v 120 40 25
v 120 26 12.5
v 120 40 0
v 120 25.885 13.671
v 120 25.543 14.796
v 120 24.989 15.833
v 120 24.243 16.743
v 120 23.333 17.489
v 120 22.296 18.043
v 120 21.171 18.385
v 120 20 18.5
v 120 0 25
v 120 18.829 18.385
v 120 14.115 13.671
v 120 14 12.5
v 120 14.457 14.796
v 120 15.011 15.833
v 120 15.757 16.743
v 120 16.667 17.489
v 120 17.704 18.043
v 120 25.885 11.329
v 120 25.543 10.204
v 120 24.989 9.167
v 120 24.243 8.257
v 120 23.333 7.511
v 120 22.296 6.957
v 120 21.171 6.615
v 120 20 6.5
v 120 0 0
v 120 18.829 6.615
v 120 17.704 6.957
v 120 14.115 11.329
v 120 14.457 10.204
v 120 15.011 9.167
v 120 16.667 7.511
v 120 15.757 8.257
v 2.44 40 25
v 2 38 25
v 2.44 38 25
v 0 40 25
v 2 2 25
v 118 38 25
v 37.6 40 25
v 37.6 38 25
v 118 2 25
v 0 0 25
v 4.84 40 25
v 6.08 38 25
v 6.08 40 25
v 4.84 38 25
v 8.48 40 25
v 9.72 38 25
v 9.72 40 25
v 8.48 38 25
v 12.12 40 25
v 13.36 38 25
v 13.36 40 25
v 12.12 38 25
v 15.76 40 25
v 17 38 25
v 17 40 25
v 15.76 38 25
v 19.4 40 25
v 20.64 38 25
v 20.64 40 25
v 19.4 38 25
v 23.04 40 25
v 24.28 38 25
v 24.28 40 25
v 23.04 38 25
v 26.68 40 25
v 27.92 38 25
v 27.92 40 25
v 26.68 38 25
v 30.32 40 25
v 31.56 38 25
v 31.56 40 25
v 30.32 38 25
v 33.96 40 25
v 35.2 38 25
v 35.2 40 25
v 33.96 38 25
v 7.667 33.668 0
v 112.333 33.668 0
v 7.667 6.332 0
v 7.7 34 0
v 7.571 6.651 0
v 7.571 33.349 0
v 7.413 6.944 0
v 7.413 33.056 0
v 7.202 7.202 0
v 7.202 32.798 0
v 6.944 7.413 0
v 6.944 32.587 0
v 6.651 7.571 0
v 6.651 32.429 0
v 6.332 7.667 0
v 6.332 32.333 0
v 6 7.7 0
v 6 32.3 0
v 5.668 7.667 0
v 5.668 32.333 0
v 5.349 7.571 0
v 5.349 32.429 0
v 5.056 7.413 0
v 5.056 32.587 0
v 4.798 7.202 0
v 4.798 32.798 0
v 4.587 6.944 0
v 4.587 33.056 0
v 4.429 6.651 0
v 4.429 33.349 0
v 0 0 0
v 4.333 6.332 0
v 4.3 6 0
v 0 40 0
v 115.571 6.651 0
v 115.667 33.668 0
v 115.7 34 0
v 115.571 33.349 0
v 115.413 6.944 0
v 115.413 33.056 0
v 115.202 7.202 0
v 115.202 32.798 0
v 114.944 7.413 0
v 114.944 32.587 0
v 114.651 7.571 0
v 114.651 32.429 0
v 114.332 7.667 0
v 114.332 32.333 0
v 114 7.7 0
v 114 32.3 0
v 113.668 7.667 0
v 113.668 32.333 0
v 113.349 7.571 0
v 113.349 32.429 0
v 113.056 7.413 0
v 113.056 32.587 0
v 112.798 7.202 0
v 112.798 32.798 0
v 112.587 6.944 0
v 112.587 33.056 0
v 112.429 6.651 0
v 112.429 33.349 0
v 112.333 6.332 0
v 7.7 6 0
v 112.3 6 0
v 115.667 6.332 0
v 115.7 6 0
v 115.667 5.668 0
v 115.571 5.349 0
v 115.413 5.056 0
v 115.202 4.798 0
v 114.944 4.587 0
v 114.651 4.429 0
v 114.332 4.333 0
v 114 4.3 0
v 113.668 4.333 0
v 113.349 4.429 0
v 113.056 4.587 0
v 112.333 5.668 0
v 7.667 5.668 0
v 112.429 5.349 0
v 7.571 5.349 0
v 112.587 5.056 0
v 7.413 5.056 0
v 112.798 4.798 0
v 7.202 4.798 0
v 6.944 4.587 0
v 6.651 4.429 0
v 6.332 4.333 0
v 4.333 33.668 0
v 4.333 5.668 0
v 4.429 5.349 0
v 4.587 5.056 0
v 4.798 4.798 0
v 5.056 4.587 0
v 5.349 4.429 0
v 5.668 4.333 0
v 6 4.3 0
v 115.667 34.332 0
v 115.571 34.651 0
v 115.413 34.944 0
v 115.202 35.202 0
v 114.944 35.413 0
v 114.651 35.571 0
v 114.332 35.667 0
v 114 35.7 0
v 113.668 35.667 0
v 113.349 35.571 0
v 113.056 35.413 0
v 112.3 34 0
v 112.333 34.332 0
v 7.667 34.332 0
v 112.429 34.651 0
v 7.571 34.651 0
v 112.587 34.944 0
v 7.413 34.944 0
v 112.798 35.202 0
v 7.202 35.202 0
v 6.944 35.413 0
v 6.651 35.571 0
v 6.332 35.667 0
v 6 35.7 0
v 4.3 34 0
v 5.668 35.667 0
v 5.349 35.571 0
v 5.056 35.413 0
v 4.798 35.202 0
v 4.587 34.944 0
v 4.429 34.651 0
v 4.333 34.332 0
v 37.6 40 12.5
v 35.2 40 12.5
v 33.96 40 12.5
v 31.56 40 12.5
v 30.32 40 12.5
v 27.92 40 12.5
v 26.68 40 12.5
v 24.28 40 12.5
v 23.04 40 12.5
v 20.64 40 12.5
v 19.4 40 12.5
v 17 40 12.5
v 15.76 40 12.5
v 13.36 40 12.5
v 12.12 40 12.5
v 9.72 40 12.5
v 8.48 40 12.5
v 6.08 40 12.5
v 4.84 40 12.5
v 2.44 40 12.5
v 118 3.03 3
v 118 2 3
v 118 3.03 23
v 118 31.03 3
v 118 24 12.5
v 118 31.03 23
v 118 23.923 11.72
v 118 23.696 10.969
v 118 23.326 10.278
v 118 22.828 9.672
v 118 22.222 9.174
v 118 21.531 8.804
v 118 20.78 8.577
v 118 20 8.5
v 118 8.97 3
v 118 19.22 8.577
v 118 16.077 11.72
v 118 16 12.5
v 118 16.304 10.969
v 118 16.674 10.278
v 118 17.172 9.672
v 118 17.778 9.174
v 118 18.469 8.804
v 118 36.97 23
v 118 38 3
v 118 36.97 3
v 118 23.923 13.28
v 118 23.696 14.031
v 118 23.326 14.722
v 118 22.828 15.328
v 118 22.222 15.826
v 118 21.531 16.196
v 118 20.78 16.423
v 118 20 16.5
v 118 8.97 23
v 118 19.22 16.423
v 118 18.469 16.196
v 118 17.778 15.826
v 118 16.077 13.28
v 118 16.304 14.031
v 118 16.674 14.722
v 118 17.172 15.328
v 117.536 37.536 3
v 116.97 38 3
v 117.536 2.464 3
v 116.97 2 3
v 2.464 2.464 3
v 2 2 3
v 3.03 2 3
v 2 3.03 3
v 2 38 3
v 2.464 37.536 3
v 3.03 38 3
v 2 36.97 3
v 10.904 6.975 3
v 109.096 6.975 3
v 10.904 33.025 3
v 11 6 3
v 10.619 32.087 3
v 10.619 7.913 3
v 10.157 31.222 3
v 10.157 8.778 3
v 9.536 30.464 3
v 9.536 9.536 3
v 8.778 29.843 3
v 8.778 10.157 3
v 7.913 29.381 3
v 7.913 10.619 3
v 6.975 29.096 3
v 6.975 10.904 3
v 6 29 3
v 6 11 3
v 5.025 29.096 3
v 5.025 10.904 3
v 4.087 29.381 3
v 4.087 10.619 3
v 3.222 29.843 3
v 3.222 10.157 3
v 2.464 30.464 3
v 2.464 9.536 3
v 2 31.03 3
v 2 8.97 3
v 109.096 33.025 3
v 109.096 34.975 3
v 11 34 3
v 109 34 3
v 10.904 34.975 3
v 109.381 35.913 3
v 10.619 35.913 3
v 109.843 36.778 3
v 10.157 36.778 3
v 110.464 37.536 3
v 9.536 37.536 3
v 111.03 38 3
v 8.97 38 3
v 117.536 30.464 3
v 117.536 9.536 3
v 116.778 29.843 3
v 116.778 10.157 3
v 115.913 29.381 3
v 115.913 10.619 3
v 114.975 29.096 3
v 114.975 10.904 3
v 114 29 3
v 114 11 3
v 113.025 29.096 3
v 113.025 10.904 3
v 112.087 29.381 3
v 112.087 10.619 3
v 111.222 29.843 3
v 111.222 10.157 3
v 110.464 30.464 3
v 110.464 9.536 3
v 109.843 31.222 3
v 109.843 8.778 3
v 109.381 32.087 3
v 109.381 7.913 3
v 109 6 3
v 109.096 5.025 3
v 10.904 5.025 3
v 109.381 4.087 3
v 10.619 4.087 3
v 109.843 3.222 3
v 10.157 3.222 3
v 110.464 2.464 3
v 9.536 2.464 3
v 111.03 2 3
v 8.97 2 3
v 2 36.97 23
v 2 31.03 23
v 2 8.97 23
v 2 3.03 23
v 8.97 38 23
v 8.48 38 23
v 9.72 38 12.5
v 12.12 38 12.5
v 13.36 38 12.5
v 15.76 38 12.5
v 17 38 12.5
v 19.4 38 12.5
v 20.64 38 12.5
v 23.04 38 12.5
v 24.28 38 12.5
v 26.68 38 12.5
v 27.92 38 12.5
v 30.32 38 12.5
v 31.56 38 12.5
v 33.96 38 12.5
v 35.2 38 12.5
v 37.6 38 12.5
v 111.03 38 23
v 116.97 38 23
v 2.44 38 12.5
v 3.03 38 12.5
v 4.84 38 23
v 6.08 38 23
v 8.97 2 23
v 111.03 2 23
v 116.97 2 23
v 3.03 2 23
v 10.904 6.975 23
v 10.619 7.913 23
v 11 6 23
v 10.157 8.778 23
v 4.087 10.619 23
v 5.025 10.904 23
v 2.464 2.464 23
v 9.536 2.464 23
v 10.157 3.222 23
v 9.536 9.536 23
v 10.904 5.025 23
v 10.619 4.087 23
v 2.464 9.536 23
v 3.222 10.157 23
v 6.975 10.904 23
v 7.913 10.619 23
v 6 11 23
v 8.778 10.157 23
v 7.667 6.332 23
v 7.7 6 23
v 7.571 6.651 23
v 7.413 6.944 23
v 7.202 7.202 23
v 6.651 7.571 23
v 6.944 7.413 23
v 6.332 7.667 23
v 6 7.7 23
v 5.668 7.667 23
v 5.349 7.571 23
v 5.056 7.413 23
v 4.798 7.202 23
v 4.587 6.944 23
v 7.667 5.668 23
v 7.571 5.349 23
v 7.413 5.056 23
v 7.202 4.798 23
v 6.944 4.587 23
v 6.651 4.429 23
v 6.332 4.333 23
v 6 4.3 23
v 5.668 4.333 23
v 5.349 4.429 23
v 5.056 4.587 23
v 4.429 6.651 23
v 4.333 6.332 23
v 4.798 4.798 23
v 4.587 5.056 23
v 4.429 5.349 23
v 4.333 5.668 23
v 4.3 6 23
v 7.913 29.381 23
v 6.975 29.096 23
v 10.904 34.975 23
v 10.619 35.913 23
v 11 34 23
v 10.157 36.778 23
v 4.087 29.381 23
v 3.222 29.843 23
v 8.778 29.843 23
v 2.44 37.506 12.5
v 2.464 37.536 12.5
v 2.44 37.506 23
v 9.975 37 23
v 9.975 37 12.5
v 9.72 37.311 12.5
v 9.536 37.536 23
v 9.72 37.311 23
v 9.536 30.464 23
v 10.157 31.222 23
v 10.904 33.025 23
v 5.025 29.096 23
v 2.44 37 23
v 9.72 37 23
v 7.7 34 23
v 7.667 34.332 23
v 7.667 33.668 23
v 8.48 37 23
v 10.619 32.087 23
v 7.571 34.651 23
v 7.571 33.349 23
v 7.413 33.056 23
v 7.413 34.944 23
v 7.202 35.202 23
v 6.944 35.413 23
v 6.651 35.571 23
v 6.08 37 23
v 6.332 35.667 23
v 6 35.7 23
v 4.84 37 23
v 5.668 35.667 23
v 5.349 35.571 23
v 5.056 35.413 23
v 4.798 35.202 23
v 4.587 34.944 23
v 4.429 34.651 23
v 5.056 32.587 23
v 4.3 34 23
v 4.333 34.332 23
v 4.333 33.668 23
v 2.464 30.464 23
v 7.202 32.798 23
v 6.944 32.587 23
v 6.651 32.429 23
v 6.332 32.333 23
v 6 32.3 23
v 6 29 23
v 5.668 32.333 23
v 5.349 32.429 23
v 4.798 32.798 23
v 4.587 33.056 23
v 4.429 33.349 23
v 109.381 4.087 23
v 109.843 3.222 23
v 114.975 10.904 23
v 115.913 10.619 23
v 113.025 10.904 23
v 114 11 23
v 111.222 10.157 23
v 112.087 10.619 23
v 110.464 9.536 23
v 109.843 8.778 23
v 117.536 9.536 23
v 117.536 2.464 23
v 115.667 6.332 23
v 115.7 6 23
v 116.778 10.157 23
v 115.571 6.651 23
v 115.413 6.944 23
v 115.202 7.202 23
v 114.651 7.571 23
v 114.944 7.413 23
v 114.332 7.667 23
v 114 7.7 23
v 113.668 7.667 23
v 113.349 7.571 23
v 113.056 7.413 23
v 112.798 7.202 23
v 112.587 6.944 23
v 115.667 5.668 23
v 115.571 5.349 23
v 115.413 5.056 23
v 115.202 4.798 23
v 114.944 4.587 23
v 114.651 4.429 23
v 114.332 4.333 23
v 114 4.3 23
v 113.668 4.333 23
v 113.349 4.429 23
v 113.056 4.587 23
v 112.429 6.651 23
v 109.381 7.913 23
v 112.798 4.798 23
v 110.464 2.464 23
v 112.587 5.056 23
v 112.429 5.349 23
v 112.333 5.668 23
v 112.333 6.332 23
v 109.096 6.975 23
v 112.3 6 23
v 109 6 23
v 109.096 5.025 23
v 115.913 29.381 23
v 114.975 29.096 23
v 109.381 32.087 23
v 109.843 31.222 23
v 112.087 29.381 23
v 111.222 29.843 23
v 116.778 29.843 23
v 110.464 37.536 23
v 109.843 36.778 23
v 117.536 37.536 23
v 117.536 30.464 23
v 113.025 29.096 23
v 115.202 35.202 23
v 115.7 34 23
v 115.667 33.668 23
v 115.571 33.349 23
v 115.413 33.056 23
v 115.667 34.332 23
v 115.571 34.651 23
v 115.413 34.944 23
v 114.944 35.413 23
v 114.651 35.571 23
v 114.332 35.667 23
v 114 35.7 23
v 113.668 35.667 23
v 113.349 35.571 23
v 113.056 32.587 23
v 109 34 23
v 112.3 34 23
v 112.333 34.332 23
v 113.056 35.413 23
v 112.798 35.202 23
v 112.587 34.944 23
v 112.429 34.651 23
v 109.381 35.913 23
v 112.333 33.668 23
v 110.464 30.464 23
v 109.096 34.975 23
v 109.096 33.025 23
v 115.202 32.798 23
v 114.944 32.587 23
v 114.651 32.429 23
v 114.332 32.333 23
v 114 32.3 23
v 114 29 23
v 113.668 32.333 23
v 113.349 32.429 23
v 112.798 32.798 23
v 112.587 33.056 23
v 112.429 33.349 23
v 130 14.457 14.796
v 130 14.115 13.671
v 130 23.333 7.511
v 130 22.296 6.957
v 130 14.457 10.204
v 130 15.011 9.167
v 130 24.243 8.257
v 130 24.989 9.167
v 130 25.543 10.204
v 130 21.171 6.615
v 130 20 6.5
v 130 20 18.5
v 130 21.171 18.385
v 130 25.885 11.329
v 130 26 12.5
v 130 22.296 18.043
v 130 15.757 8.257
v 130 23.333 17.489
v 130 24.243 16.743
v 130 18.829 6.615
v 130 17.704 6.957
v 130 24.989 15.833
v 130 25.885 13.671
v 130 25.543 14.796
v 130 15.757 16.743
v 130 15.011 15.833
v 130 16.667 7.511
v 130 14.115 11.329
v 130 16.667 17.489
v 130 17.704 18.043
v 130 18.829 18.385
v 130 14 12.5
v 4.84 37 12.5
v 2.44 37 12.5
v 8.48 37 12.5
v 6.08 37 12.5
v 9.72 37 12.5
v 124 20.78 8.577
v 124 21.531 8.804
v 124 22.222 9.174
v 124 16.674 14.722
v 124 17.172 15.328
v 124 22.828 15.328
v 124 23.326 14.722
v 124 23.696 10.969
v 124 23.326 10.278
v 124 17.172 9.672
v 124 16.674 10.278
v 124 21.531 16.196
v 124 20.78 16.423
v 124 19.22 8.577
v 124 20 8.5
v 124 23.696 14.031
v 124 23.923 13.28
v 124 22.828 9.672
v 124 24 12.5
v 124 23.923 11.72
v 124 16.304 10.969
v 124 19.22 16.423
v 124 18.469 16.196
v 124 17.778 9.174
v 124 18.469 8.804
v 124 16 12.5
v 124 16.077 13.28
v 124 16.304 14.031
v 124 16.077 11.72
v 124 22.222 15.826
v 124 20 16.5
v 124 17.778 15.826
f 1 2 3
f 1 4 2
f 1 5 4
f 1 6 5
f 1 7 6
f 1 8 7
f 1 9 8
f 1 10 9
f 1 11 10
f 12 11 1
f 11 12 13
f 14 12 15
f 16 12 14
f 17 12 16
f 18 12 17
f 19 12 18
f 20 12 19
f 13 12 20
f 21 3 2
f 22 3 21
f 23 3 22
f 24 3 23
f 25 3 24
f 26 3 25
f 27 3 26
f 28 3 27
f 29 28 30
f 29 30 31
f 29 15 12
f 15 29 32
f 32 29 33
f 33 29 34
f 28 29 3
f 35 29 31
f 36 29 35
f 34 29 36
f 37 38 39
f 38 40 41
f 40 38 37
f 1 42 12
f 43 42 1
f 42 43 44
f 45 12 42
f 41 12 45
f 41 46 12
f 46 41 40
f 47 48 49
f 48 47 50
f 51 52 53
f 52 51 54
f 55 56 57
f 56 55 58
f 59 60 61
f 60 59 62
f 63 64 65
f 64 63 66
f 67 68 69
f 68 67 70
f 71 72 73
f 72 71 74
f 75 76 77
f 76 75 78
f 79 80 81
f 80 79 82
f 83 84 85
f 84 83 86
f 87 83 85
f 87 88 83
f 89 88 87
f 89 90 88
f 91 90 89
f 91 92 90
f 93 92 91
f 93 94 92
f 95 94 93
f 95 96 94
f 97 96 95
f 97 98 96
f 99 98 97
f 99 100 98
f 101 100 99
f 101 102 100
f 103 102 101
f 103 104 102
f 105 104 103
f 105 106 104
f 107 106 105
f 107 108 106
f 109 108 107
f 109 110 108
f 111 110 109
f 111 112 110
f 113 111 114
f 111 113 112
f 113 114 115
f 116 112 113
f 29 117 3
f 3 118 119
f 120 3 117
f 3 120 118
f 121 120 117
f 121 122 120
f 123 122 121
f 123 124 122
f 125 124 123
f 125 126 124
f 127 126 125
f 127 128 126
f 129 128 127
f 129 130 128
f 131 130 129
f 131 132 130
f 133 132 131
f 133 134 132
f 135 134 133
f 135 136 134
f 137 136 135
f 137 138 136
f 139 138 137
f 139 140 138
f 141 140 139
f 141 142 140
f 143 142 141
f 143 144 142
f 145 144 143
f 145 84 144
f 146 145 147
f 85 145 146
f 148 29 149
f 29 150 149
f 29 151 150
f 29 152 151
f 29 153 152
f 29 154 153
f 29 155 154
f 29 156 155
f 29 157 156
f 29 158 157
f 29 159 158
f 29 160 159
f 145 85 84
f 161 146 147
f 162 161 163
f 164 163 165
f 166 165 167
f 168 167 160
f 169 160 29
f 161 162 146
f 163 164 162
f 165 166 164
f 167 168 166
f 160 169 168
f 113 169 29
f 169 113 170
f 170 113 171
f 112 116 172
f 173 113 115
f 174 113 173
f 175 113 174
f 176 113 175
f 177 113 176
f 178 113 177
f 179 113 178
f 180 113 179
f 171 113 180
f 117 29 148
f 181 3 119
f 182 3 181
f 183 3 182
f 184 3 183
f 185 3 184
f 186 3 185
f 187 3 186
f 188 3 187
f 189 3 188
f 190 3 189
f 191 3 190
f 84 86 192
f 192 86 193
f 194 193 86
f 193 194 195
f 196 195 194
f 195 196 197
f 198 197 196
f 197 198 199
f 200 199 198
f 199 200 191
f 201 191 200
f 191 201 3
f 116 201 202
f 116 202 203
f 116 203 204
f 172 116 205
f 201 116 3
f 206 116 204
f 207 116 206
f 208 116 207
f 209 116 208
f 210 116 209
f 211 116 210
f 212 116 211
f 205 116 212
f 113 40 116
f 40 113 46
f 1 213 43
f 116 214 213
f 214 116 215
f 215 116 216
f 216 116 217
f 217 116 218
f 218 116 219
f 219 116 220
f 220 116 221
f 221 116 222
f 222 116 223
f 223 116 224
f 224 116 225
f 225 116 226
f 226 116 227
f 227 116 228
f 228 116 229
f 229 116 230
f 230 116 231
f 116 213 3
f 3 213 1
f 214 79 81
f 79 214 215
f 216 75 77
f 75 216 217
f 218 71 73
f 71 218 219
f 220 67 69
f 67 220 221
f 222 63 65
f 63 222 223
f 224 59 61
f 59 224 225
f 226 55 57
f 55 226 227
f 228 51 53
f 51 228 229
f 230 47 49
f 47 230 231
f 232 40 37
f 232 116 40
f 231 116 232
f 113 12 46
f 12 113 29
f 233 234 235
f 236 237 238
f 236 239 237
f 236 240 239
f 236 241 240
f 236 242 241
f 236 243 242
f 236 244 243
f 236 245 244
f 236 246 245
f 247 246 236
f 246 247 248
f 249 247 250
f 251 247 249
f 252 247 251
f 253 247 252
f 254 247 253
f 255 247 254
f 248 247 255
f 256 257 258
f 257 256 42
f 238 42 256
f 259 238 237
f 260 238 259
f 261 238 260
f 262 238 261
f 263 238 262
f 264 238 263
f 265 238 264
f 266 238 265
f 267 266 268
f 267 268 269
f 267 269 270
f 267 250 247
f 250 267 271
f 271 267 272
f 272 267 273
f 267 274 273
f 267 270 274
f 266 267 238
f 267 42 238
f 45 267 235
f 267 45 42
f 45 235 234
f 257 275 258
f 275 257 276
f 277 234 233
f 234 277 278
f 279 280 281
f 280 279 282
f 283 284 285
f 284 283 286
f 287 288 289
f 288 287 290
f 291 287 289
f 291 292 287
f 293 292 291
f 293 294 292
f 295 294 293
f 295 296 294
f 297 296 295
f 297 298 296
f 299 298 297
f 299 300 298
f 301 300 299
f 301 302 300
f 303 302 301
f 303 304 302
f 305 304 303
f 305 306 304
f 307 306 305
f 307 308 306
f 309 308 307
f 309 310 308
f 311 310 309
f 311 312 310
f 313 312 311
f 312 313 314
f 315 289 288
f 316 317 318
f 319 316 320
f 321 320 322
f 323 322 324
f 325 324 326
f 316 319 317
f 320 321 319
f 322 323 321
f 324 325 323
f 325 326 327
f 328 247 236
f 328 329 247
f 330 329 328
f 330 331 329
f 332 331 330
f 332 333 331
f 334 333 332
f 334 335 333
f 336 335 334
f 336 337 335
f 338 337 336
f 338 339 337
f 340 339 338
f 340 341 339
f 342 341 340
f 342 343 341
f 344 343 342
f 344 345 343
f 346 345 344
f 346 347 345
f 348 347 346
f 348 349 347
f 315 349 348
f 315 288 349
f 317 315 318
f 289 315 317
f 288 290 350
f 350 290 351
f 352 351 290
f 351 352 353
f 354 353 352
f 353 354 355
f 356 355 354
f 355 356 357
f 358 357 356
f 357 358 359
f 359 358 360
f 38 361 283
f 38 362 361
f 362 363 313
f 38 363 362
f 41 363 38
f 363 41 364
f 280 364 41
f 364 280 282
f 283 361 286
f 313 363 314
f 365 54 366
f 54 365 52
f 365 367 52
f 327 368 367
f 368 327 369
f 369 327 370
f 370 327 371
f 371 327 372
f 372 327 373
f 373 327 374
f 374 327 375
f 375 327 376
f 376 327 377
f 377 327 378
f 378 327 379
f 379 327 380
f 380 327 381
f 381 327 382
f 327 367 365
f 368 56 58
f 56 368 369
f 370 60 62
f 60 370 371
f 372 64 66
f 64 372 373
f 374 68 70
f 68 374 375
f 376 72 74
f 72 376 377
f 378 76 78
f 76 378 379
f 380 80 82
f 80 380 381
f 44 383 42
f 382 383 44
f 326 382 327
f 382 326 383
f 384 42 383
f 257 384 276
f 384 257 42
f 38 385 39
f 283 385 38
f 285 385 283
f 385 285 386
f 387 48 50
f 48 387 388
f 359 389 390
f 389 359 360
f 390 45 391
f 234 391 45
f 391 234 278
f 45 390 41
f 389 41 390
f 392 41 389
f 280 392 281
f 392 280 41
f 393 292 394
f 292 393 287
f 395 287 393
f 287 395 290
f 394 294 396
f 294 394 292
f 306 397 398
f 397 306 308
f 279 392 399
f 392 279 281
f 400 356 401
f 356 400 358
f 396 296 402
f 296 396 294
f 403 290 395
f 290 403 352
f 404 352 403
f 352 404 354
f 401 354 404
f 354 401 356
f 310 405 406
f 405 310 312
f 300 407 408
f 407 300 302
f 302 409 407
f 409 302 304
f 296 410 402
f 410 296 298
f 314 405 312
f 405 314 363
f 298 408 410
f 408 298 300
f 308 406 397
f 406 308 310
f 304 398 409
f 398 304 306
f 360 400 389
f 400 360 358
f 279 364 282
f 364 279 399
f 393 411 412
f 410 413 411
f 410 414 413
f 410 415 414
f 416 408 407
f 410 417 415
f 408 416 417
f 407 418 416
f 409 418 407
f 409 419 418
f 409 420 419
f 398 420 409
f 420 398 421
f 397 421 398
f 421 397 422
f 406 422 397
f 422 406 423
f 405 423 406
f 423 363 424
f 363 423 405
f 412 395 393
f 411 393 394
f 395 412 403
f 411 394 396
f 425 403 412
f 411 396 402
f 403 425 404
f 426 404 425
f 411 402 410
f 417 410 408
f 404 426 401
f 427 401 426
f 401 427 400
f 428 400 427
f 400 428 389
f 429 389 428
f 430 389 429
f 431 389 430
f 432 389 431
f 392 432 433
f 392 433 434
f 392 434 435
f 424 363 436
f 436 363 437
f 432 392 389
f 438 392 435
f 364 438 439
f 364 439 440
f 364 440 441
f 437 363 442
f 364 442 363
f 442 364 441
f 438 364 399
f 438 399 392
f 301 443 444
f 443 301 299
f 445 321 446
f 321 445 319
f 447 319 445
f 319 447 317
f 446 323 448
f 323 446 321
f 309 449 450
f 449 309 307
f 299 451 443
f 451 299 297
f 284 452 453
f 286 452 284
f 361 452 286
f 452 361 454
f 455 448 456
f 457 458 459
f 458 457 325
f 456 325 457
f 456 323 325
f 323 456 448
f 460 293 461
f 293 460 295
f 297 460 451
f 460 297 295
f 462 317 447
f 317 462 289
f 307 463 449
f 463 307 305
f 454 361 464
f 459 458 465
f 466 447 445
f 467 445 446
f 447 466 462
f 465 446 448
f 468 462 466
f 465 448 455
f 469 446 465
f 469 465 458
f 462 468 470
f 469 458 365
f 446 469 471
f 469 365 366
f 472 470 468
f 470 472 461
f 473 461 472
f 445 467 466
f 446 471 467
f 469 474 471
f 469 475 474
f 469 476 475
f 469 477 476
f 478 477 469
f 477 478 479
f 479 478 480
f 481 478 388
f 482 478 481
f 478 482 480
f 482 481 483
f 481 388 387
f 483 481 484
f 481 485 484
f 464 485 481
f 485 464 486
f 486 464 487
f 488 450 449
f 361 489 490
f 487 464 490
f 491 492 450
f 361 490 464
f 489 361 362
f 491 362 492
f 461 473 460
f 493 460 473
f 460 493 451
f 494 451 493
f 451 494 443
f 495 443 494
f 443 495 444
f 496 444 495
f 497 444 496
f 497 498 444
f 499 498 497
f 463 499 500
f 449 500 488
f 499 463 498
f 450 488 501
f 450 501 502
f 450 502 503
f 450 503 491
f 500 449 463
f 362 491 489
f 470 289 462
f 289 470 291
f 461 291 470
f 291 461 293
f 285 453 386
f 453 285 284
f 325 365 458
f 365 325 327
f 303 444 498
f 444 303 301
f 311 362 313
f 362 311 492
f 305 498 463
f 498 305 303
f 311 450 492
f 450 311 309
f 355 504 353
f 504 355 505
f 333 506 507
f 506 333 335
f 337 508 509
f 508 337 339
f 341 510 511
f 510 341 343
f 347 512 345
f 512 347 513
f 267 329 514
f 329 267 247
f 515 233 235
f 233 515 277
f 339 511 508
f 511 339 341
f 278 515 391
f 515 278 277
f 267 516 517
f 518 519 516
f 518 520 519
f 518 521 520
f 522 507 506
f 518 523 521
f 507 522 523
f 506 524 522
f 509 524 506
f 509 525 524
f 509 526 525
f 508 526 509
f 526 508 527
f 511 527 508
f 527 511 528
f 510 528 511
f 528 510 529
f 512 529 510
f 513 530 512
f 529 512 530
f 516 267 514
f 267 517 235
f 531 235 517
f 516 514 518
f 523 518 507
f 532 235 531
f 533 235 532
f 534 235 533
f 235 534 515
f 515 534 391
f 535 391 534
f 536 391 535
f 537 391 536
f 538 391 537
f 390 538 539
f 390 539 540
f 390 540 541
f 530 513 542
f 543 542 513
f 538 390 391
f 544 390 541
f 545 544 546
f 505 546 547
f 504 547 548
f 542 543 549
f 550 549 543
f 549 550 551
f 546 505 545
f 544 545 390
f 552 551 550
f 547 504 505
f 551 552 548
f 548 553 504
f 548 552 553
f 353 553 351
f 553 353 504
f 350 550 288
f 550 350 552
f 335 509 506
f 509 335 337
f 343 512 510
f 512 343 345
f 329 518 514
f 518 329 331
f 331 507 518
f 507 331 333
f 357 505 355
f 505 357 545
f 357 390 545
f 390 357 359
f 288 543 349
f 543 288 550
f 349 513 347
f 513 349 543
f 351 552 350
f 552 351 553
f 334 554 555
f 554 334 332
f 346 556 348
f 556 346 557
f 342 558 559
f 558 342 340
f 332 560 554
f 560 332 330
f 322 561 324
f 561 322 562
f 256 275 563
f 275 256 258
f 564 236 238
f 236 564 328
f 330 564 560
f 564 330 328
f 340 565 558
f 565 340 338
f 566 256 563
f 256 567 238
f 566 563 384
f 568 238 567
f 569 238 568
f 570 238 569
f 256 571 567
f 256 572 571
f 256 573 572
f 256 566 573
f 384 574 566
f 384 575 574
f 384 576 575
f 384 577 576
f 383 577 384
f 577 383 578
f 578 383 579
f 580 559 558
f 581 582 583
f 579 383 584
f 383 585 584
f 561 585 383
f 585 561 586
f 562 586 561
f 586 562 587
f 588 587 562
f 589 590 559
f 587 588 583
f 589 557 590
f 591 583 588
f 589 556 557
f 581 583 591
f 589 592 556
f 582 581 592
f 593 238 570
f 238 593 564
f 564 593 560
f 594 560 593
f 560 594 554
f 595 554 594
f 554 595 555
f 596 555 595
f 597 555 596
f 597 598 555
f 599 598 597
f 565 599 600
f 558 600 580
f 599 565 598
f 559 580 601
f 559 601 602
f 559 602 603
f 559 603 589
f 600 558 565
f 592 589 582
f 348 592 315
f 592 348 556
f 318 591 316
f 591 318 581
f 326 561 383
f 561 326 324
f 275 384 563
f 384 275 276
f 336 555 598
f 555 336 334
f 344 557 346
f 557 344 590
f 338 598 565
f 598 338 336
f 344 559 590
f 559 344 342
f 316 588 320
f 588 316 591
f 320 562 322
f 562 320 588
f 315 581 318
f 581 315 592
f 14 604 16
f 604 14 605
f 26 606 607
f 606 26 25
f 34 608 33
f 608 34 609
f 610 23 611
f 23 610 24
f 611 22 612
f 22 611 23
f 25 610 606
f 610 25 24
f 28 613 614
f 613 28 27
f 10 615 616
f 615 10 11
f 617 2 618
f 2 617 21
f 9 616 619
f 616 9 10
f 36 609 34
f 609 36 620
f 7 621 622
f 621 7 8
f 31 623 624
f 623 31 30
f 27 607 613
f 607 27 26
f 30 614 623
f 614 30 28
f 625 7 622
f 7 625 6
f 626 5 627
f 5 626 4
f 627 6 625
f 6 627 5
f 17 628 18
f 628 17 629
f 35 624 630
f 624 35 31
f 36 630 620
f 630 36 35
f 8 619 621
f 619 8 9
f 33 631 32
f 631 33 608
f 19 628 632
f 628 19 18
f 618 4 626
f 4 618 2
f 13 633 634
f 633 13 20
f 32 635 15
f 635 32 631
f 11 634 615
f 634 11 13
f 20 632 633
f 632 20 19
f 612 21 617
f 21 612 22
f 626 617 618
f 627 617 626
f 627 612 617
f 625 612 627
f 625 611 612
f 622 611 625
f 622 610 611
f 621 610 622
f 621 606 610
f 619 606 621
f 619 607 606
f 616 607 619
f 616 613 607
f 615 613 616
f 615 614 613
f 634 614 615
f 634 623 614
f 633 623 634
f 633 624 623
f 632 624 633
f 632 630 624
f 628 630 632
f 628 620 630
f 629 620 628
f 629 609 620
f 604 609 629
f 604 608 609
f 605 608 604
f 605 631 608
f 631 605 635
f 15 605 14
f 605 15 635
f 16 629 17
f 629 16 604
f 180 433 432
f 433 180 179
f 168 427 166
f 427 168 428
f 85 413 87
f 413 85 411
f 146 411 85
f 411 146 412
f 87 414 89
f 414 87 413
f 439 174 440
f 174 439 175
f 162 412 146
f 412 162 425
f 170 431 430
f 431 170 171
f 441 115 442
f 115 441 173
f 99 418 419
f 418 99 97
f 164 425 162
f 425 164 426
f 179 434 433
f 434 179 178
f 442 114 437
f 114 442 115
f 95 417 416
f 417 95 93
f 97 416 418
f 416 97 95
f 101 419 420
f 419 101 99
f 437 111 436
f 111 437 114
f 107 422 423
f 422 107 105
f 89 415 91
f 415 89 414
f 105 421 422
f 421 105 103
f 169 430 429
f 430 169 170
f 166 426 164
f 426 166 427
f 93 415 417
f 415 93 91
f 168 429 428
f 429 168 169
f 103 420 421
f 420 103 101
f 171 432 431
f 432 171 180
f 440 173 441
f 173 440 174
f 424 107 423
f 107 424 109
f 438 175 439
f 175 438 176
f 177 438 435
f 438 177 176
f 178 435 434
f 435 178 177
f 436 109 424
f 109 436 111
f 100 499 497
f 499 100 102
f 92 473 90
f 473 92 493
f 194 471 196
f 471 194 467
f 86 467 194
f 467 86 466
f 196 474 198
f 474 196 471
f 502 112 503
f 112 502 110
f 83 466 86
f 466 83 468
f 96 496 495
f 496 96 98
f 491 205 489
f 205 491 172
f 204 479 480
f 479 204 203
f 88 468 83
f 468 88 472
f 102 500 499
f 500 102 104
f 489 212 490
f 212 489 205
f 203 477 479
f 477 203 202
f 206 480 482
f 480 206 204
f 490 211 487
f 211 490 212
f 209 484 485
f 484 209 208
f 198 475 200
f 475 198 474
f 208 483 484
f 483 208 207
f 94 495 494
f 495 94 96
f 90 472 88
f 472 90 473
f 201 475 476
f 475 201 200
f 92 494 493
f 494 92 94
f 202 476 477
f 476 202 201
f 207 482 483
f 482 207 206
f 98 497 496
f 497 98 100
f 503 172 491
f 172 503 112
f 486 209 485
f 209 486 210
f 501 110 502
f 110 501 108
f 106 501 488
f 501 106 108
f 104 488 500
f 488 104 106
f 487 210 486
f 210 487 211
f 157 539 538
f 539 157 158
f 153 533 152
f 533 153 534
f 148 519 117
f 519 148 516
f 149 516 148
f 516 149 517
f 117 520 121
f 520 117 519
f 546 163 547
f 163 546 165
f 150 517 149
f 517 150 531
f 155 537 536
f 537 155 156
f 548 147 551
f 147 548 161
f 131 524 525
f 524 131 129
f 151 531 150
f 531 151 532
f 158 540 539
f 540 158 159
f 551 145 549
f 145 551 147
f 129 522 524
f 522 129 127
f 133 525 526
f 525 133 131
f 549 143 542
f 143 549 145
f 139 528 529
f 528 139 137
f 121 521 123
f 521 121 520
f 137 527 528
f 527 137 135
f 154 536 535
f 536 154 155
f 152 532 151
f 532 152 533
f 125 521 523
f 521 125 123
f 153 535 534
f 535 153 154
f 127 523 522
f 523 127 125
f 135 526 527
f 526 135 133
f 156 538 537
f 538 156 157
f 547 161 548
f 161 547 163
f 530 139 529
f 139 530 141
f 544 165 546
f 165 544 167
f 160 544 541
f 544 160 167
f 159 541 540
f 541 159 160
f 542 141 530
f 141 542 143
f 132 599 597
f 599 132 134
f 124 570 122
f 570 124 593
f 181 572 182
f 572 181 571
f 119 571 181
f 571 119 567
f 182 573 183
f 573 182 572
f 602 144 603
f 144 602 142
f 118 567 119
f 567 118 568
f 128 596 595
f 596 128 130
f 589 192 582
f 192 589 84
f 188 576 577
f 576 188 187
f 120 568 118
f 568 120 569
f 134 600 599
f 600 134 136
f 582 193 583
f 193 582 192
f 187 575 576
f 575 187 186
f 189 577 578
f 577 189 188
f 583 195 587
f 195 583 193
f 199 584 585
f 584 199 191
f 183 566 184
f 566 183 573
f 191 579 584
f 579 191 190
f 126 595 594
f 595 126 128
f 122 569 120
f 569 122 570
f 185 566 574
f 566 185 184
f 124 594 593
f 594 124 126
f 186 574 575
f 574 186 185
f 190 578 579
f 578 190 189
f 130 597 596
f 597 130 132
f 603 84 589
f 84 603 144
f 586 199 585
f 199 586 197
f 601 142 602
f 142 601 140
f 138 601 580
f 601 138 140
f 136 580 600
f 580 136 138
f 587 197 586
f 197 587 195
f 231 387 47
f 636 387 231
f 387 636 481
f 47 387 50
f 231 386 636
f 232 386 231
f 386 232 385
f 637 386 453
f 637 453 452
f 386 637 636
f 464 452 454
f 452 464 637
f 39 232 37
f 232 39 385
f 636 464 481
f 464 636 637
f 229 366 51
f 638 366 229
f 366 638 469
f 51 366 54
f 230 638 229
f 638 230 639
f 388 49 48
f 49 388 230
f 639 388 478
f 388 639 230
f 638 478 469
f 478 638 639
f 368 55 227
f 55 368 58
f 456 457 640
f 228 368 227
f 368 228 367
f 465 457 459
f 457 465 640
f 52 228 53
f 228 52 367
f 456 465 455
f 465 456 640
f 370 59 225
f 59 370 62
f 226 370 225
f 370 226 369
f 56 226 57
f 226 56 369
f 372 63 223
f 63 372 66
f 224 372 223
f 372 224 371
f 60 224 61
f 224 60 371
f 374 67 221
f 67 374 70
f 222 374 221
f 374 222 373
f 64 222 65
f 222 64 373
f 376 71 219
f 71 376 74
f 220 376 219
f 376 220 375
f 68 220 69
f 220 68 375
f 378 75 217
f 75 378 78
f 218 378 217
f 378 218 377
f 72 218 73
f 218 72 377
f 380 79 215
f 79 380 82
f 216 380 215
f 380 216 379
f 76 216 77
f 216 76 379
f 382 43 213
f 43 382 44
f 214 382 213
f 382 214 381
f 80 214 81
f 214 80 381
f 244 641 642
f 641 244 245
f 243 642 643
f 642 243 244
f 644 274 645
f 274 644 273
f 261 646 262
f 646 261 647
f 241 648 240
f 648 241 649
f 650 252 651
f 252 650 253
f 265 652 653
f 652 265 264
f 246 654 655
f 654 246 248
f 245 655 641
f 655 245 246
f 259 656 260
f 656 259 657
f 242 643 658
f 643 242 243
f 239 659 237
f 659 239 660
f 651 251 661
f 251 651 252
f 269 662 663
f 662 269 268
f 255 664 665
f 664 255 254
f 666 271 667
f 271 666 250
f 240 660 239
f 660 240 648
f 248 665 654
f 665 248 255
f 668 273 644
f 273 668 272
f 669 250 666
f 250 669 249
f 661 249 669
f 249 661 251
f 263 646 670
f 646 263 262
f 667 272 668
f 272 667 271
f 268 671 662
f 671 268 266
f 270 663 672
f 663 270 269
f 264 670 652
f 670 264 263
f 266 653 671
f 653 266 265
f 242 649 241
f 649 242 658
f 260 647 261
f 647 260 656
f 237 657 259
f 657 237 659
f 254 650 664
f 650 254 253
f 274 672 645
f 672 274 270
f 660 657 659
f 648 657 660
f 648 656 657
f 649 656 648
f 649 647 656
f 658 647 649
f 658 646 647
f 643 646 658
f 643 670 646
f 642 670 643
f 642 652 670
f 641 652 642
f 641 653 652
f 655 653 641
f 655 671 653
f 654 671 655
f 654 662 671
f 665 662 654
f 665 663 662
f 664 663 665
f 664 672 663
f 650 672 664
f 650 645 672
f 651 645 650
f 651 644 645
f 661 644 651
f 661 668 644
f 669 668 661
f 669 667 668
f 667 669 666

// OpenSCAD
$fn = 32;

// ----------------------------------------------------------------------
// Enclosure body: 120 x 40 x 25 mm, wall 2 mm
// ----------------------------------------------------------------------

// --- parameters (mm) ---
length = 120;             // outside length, X
width = 40;               // outside width, Y
height = 25;              // outside height, Z
wall = 2;                 // side wall thickness
floor_t = 3;              // floor thickness
boss_d = 10;              // corner boss diameter
boss_h = 20;              // corner boss height above the floor
boss_hole_d = 3.4;        // lid screw clearance in the boss
boss_lip = 6;             // boss centre inset from the corner
vent_slots = 10;          // vent slots in the long wall
vent_w = 2.4;             // vent slot width
vent_h = 16;              // vent slot height
vent_pitch = 3.64;        // vent slot pitch
vent_z = 12.5;            // vent slot sill height
nipple_d = 12;            // cable gland boss diameter
nipple_h = 10;            // cable gland boss height
nipple_bore = 8;          // cable gland bore

module shell() {
  difference() {
    cube([length, width, height]);
    /* hollow, open at the top */
    translate([wall, wall, floor_t])
      cube([length - 2 * wall, width - 2 * wall, height]);
  }
}

module bosses() {
  /* corner bosses, sunk 1 mm into the floor */
  for (sx = [0, 1]) for (sy = [0, 1])
    translate([sx * (length - 2 * boss_lip) + boss_lip, sy * (width - 2 * boss_lip) + boss_lip, floor_t - 1])
      cylinder(h = boss_h + 1, d = boss_d);
}

module gland() {
  /* boss on the short wall, sunk 1 mm into it */
  translate([length - 1, width / 2, height * 0.5]) rotate([0, 90, 0])
    cylinder(h = nipple_h + 1, d = nipple_d);
}

difference() {
  union() {
    shell();
    bosses();
    gland();
  }
  /* boss screw holes */
  for (sx = [0, 1]) for (sy = [0, 1])
    translate([sx * (length - 2 * boss_lip) + boss_lip, sy * (width - 2 * boss_lip) + boss_lip, -1]) cylinder(h = floor_t + boss_h + 2, d = boss_hole_d);
  /* vent grille in the +Y wall */
  for (i = [0 : vent_slots - 1]) translate([vent_pitch * (i + 1) - vent_w / 2, width - wall - 1, vent_z]) cube([vent_w, wall + 2, vent_h]);
  translate([length, width / 2, height * 0.5]) rotate([0, 90, 0]) translate([0, 0, -nipple_h - 2]) cylinder(h = nipple_h + wall + 4, d = nipple_bore);
}
